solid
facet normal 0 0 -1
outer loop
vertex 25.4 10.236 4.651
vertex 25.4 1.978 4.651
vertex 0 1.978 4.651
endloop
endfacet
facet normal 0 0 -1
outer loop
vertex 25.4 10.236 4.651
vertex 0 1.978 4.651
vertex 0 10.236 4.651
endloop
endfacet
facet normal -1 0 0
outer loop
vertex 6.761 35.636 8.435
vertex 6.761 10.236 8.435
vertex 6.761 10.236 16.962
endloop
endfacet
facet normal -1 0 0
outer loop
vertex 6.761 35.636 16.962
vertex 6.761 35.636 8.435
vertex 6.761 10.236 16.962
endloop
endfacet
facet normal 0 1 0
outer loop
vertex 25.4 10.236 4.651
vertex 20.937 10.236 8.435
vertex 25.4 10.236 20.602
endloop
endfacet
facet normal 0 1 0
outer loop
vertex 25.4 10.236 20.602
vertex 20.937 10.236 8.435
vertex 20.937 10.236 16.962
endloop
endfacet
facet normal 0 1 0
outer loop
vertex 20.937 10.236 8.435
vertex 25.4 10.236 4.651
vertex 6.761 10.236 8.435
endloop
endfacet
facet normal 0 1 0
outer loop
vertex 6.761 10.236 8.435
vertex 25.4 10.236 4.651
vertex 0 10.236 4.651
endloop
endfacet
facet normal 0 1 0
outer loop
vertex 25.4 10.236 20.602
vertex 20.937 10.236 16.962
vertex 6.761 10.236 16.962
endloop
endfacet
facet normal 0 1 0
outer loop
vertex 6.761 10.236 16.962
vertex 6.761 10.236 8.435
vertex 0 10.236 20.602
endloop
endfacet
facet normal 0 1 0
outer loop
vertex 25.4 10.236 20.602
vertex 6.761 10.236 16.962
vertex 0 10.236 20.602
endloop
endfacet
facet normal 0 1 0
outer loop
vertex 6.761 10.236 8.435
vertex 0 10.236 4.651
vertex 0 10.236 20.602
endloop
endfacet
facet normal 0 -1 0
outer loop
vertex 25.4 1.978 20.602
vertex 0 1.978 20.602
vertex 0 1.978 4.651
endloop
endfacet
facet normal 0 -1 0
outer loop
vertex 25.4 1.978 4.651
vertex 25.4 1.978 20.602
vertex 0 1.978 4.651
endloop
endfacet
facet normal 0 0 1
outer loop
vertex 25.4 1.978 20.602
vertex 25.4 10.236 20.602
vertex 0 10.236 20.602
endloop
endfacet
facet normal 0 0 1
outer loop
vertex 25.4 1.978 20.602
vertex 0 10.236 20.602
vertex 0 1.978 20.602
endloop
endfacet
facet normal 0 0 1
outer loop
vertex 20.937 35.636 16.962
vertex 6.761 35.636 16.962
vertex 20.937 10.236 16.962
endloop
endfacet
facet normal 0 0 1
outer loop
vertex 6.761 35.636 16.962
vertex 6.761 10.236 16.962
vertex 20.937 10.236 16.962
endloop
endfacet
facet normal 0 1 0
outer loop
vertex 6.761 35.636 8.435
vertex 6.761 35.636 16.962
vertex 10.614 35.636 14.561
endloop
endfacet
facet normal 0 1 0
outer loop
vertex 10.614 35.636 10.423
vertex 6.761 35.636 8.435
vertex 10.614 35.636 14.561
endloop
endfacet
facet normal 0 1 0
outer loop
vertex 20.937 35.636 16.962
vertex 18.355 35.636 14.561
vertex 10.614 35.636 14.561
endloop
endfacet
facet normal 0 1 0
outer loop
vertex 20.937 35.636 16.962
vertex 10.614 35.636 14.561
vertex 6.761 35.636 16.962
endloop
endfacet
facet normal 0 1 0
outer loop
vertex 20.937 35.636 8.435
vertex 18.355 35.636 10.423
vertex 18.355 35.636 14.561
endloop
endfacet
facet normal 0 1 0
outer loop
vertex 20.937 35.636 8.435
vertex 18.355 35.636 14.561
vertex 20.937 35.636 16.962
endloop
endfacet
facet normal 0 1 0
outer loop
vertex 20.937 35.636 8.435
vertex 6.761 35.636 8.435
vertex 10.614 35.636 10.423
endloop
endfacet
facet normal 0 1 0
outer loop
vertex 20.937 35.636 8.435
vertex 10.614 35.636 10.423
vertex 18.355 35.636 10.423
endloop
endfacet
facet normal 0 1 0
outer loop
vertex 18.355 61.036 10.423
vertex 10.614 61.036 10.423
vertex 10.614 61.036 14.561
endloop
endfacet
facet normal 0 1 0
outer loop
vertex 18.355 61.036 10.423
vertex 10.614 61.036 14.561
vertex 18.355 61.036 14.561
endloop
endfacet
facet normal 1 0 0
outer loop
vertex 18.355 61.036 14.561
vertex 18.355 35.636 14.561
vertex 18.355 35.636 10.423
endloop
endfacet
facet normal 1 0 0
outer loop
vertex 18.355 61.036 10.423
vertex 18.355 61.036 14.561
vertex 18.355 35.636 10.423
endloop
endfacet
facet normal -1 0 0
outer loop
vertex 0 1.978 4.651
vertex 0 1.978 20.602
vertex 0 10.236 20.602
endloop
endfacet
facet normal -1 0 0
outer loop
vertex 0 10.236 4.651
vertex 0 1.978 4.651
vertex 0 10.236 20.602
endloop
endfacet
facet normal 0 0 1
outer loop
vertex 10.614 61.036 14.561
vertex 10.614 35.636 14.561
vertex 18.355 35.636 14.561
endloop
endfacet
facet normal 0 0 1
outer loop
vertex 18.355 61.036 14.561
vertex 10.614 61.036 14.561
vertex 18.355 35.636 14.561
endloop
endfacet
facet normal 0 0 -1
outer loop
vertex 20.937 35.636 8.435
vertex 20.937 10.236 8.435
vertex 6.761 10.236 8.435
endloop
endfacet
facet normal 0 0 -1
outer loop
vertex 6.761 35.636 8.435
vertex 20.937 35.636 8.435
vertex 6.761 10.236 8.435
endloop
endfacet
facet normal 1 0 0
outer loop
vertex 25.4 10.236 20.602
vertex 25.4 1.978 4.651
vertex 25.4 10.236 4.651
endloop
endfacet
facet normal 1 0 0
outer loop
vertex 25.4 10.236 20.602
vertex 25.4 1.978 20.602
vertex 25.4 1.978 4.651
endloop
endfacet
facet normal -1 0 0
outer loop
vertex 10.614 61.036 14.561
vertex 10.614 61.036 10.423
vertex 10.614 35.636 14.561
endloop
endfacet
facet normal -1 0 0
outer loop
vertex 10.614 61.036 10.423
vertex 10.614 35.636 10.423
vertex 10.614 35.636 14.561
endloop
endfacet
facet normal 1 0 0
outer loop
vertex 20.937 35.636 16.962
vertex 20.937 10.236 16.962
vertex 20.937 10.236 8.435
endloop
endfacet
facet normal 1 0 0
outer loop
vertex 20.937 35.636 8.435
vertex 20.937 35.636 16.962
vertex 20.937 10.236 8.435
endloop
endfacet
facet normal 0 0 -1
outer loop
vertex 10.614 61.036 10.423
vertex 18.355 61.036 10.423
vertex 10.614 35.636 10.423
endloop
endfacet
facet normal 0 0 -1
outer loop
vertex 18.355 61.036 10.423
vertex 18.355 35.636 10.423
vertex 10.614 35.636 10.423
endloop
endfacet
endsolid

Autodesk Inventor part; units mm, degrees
ref_plane "YZ Plane" through (0, 0, 0) normal (1, 0, 0) x (0, 1, 0)
ref_plane "XZ Plane" through (0, 0, 0) normal (0, 1, 0) x (-1, 0, 0)
ref_plane "XY Plane" through (0, 0, 0) normal (0, 0, 1) x (1, 0, 0)
sketch "Sketch1" plane through (0, 0, 0) normal (1, 0, 0) x (0, 1, 0)
  line L0 (10.236, 20.6024) -> (1.9777, 20.6024)
  line L1 (1.9777, 20.6024) -> (1.9777, 4.6508)
  line L2 (1.9777, 4.6508) -> (10.236, 4.6508)
  line L3 (10.236, 4.6508) -> (10.236, 20.6024)
  point P0 (0, 0)
extrude "Extrusion1" add sketch "Sketch1" along normal blind 25.4
sketch "Sketch2" plane through (0, 10.236, 20.6024) normal (0, 1, 0) x (1, 0, 0)
  line L0 (6.7613, 3.64) -> (20.9369, 3.64)
  line L1 (20.9369, 3.64) -> (20.9369, 12.1675)
  line L2 (20.9369, 12.1675) -> (6.7613, 12.1675)
  line L3 (6.7613, 12.1675) -> (6.7613, 3.64)
  line L4 (10.89, 6.1434) -> (17.4809, 6.1434)
  line L5 (17.4809, 6.1434) -> (17.4809, 9.7454)
  line L6 (17.4809, 9.7454) -> (11.2732, 9.7454)
  line L7 (11.2732, 9.7454) -> (11.2732, 6.1434)
  point P0 (0, 20.6024)
extrude "Extrusion2" add sketch "Sketch2" along normal blind 25.4 contours L3 L2 L1 L0 | L7 L6 L5 L4
sketch "Sketch3" plane through (0, 35.636, 20.6024) normal (0, 1, 0) x (1, 0, 0)
  line L0 (10.6145, 6.041) -> (18.3551, 6.041)
  line L1 (18.3551, 6.041) -> (18.3551, 10.1795)
  line L2 (18.3551, 10.1795) -> (10.6145, 10.1795)
  line L3 (10.6145, 10.1795) -> (10.6145, 6.041)
  point P0 (0, 20.6024)
extrude "Extrusion3" add sketch "Sketch3" along normal blind 25.4
properties part number "2nd model"
